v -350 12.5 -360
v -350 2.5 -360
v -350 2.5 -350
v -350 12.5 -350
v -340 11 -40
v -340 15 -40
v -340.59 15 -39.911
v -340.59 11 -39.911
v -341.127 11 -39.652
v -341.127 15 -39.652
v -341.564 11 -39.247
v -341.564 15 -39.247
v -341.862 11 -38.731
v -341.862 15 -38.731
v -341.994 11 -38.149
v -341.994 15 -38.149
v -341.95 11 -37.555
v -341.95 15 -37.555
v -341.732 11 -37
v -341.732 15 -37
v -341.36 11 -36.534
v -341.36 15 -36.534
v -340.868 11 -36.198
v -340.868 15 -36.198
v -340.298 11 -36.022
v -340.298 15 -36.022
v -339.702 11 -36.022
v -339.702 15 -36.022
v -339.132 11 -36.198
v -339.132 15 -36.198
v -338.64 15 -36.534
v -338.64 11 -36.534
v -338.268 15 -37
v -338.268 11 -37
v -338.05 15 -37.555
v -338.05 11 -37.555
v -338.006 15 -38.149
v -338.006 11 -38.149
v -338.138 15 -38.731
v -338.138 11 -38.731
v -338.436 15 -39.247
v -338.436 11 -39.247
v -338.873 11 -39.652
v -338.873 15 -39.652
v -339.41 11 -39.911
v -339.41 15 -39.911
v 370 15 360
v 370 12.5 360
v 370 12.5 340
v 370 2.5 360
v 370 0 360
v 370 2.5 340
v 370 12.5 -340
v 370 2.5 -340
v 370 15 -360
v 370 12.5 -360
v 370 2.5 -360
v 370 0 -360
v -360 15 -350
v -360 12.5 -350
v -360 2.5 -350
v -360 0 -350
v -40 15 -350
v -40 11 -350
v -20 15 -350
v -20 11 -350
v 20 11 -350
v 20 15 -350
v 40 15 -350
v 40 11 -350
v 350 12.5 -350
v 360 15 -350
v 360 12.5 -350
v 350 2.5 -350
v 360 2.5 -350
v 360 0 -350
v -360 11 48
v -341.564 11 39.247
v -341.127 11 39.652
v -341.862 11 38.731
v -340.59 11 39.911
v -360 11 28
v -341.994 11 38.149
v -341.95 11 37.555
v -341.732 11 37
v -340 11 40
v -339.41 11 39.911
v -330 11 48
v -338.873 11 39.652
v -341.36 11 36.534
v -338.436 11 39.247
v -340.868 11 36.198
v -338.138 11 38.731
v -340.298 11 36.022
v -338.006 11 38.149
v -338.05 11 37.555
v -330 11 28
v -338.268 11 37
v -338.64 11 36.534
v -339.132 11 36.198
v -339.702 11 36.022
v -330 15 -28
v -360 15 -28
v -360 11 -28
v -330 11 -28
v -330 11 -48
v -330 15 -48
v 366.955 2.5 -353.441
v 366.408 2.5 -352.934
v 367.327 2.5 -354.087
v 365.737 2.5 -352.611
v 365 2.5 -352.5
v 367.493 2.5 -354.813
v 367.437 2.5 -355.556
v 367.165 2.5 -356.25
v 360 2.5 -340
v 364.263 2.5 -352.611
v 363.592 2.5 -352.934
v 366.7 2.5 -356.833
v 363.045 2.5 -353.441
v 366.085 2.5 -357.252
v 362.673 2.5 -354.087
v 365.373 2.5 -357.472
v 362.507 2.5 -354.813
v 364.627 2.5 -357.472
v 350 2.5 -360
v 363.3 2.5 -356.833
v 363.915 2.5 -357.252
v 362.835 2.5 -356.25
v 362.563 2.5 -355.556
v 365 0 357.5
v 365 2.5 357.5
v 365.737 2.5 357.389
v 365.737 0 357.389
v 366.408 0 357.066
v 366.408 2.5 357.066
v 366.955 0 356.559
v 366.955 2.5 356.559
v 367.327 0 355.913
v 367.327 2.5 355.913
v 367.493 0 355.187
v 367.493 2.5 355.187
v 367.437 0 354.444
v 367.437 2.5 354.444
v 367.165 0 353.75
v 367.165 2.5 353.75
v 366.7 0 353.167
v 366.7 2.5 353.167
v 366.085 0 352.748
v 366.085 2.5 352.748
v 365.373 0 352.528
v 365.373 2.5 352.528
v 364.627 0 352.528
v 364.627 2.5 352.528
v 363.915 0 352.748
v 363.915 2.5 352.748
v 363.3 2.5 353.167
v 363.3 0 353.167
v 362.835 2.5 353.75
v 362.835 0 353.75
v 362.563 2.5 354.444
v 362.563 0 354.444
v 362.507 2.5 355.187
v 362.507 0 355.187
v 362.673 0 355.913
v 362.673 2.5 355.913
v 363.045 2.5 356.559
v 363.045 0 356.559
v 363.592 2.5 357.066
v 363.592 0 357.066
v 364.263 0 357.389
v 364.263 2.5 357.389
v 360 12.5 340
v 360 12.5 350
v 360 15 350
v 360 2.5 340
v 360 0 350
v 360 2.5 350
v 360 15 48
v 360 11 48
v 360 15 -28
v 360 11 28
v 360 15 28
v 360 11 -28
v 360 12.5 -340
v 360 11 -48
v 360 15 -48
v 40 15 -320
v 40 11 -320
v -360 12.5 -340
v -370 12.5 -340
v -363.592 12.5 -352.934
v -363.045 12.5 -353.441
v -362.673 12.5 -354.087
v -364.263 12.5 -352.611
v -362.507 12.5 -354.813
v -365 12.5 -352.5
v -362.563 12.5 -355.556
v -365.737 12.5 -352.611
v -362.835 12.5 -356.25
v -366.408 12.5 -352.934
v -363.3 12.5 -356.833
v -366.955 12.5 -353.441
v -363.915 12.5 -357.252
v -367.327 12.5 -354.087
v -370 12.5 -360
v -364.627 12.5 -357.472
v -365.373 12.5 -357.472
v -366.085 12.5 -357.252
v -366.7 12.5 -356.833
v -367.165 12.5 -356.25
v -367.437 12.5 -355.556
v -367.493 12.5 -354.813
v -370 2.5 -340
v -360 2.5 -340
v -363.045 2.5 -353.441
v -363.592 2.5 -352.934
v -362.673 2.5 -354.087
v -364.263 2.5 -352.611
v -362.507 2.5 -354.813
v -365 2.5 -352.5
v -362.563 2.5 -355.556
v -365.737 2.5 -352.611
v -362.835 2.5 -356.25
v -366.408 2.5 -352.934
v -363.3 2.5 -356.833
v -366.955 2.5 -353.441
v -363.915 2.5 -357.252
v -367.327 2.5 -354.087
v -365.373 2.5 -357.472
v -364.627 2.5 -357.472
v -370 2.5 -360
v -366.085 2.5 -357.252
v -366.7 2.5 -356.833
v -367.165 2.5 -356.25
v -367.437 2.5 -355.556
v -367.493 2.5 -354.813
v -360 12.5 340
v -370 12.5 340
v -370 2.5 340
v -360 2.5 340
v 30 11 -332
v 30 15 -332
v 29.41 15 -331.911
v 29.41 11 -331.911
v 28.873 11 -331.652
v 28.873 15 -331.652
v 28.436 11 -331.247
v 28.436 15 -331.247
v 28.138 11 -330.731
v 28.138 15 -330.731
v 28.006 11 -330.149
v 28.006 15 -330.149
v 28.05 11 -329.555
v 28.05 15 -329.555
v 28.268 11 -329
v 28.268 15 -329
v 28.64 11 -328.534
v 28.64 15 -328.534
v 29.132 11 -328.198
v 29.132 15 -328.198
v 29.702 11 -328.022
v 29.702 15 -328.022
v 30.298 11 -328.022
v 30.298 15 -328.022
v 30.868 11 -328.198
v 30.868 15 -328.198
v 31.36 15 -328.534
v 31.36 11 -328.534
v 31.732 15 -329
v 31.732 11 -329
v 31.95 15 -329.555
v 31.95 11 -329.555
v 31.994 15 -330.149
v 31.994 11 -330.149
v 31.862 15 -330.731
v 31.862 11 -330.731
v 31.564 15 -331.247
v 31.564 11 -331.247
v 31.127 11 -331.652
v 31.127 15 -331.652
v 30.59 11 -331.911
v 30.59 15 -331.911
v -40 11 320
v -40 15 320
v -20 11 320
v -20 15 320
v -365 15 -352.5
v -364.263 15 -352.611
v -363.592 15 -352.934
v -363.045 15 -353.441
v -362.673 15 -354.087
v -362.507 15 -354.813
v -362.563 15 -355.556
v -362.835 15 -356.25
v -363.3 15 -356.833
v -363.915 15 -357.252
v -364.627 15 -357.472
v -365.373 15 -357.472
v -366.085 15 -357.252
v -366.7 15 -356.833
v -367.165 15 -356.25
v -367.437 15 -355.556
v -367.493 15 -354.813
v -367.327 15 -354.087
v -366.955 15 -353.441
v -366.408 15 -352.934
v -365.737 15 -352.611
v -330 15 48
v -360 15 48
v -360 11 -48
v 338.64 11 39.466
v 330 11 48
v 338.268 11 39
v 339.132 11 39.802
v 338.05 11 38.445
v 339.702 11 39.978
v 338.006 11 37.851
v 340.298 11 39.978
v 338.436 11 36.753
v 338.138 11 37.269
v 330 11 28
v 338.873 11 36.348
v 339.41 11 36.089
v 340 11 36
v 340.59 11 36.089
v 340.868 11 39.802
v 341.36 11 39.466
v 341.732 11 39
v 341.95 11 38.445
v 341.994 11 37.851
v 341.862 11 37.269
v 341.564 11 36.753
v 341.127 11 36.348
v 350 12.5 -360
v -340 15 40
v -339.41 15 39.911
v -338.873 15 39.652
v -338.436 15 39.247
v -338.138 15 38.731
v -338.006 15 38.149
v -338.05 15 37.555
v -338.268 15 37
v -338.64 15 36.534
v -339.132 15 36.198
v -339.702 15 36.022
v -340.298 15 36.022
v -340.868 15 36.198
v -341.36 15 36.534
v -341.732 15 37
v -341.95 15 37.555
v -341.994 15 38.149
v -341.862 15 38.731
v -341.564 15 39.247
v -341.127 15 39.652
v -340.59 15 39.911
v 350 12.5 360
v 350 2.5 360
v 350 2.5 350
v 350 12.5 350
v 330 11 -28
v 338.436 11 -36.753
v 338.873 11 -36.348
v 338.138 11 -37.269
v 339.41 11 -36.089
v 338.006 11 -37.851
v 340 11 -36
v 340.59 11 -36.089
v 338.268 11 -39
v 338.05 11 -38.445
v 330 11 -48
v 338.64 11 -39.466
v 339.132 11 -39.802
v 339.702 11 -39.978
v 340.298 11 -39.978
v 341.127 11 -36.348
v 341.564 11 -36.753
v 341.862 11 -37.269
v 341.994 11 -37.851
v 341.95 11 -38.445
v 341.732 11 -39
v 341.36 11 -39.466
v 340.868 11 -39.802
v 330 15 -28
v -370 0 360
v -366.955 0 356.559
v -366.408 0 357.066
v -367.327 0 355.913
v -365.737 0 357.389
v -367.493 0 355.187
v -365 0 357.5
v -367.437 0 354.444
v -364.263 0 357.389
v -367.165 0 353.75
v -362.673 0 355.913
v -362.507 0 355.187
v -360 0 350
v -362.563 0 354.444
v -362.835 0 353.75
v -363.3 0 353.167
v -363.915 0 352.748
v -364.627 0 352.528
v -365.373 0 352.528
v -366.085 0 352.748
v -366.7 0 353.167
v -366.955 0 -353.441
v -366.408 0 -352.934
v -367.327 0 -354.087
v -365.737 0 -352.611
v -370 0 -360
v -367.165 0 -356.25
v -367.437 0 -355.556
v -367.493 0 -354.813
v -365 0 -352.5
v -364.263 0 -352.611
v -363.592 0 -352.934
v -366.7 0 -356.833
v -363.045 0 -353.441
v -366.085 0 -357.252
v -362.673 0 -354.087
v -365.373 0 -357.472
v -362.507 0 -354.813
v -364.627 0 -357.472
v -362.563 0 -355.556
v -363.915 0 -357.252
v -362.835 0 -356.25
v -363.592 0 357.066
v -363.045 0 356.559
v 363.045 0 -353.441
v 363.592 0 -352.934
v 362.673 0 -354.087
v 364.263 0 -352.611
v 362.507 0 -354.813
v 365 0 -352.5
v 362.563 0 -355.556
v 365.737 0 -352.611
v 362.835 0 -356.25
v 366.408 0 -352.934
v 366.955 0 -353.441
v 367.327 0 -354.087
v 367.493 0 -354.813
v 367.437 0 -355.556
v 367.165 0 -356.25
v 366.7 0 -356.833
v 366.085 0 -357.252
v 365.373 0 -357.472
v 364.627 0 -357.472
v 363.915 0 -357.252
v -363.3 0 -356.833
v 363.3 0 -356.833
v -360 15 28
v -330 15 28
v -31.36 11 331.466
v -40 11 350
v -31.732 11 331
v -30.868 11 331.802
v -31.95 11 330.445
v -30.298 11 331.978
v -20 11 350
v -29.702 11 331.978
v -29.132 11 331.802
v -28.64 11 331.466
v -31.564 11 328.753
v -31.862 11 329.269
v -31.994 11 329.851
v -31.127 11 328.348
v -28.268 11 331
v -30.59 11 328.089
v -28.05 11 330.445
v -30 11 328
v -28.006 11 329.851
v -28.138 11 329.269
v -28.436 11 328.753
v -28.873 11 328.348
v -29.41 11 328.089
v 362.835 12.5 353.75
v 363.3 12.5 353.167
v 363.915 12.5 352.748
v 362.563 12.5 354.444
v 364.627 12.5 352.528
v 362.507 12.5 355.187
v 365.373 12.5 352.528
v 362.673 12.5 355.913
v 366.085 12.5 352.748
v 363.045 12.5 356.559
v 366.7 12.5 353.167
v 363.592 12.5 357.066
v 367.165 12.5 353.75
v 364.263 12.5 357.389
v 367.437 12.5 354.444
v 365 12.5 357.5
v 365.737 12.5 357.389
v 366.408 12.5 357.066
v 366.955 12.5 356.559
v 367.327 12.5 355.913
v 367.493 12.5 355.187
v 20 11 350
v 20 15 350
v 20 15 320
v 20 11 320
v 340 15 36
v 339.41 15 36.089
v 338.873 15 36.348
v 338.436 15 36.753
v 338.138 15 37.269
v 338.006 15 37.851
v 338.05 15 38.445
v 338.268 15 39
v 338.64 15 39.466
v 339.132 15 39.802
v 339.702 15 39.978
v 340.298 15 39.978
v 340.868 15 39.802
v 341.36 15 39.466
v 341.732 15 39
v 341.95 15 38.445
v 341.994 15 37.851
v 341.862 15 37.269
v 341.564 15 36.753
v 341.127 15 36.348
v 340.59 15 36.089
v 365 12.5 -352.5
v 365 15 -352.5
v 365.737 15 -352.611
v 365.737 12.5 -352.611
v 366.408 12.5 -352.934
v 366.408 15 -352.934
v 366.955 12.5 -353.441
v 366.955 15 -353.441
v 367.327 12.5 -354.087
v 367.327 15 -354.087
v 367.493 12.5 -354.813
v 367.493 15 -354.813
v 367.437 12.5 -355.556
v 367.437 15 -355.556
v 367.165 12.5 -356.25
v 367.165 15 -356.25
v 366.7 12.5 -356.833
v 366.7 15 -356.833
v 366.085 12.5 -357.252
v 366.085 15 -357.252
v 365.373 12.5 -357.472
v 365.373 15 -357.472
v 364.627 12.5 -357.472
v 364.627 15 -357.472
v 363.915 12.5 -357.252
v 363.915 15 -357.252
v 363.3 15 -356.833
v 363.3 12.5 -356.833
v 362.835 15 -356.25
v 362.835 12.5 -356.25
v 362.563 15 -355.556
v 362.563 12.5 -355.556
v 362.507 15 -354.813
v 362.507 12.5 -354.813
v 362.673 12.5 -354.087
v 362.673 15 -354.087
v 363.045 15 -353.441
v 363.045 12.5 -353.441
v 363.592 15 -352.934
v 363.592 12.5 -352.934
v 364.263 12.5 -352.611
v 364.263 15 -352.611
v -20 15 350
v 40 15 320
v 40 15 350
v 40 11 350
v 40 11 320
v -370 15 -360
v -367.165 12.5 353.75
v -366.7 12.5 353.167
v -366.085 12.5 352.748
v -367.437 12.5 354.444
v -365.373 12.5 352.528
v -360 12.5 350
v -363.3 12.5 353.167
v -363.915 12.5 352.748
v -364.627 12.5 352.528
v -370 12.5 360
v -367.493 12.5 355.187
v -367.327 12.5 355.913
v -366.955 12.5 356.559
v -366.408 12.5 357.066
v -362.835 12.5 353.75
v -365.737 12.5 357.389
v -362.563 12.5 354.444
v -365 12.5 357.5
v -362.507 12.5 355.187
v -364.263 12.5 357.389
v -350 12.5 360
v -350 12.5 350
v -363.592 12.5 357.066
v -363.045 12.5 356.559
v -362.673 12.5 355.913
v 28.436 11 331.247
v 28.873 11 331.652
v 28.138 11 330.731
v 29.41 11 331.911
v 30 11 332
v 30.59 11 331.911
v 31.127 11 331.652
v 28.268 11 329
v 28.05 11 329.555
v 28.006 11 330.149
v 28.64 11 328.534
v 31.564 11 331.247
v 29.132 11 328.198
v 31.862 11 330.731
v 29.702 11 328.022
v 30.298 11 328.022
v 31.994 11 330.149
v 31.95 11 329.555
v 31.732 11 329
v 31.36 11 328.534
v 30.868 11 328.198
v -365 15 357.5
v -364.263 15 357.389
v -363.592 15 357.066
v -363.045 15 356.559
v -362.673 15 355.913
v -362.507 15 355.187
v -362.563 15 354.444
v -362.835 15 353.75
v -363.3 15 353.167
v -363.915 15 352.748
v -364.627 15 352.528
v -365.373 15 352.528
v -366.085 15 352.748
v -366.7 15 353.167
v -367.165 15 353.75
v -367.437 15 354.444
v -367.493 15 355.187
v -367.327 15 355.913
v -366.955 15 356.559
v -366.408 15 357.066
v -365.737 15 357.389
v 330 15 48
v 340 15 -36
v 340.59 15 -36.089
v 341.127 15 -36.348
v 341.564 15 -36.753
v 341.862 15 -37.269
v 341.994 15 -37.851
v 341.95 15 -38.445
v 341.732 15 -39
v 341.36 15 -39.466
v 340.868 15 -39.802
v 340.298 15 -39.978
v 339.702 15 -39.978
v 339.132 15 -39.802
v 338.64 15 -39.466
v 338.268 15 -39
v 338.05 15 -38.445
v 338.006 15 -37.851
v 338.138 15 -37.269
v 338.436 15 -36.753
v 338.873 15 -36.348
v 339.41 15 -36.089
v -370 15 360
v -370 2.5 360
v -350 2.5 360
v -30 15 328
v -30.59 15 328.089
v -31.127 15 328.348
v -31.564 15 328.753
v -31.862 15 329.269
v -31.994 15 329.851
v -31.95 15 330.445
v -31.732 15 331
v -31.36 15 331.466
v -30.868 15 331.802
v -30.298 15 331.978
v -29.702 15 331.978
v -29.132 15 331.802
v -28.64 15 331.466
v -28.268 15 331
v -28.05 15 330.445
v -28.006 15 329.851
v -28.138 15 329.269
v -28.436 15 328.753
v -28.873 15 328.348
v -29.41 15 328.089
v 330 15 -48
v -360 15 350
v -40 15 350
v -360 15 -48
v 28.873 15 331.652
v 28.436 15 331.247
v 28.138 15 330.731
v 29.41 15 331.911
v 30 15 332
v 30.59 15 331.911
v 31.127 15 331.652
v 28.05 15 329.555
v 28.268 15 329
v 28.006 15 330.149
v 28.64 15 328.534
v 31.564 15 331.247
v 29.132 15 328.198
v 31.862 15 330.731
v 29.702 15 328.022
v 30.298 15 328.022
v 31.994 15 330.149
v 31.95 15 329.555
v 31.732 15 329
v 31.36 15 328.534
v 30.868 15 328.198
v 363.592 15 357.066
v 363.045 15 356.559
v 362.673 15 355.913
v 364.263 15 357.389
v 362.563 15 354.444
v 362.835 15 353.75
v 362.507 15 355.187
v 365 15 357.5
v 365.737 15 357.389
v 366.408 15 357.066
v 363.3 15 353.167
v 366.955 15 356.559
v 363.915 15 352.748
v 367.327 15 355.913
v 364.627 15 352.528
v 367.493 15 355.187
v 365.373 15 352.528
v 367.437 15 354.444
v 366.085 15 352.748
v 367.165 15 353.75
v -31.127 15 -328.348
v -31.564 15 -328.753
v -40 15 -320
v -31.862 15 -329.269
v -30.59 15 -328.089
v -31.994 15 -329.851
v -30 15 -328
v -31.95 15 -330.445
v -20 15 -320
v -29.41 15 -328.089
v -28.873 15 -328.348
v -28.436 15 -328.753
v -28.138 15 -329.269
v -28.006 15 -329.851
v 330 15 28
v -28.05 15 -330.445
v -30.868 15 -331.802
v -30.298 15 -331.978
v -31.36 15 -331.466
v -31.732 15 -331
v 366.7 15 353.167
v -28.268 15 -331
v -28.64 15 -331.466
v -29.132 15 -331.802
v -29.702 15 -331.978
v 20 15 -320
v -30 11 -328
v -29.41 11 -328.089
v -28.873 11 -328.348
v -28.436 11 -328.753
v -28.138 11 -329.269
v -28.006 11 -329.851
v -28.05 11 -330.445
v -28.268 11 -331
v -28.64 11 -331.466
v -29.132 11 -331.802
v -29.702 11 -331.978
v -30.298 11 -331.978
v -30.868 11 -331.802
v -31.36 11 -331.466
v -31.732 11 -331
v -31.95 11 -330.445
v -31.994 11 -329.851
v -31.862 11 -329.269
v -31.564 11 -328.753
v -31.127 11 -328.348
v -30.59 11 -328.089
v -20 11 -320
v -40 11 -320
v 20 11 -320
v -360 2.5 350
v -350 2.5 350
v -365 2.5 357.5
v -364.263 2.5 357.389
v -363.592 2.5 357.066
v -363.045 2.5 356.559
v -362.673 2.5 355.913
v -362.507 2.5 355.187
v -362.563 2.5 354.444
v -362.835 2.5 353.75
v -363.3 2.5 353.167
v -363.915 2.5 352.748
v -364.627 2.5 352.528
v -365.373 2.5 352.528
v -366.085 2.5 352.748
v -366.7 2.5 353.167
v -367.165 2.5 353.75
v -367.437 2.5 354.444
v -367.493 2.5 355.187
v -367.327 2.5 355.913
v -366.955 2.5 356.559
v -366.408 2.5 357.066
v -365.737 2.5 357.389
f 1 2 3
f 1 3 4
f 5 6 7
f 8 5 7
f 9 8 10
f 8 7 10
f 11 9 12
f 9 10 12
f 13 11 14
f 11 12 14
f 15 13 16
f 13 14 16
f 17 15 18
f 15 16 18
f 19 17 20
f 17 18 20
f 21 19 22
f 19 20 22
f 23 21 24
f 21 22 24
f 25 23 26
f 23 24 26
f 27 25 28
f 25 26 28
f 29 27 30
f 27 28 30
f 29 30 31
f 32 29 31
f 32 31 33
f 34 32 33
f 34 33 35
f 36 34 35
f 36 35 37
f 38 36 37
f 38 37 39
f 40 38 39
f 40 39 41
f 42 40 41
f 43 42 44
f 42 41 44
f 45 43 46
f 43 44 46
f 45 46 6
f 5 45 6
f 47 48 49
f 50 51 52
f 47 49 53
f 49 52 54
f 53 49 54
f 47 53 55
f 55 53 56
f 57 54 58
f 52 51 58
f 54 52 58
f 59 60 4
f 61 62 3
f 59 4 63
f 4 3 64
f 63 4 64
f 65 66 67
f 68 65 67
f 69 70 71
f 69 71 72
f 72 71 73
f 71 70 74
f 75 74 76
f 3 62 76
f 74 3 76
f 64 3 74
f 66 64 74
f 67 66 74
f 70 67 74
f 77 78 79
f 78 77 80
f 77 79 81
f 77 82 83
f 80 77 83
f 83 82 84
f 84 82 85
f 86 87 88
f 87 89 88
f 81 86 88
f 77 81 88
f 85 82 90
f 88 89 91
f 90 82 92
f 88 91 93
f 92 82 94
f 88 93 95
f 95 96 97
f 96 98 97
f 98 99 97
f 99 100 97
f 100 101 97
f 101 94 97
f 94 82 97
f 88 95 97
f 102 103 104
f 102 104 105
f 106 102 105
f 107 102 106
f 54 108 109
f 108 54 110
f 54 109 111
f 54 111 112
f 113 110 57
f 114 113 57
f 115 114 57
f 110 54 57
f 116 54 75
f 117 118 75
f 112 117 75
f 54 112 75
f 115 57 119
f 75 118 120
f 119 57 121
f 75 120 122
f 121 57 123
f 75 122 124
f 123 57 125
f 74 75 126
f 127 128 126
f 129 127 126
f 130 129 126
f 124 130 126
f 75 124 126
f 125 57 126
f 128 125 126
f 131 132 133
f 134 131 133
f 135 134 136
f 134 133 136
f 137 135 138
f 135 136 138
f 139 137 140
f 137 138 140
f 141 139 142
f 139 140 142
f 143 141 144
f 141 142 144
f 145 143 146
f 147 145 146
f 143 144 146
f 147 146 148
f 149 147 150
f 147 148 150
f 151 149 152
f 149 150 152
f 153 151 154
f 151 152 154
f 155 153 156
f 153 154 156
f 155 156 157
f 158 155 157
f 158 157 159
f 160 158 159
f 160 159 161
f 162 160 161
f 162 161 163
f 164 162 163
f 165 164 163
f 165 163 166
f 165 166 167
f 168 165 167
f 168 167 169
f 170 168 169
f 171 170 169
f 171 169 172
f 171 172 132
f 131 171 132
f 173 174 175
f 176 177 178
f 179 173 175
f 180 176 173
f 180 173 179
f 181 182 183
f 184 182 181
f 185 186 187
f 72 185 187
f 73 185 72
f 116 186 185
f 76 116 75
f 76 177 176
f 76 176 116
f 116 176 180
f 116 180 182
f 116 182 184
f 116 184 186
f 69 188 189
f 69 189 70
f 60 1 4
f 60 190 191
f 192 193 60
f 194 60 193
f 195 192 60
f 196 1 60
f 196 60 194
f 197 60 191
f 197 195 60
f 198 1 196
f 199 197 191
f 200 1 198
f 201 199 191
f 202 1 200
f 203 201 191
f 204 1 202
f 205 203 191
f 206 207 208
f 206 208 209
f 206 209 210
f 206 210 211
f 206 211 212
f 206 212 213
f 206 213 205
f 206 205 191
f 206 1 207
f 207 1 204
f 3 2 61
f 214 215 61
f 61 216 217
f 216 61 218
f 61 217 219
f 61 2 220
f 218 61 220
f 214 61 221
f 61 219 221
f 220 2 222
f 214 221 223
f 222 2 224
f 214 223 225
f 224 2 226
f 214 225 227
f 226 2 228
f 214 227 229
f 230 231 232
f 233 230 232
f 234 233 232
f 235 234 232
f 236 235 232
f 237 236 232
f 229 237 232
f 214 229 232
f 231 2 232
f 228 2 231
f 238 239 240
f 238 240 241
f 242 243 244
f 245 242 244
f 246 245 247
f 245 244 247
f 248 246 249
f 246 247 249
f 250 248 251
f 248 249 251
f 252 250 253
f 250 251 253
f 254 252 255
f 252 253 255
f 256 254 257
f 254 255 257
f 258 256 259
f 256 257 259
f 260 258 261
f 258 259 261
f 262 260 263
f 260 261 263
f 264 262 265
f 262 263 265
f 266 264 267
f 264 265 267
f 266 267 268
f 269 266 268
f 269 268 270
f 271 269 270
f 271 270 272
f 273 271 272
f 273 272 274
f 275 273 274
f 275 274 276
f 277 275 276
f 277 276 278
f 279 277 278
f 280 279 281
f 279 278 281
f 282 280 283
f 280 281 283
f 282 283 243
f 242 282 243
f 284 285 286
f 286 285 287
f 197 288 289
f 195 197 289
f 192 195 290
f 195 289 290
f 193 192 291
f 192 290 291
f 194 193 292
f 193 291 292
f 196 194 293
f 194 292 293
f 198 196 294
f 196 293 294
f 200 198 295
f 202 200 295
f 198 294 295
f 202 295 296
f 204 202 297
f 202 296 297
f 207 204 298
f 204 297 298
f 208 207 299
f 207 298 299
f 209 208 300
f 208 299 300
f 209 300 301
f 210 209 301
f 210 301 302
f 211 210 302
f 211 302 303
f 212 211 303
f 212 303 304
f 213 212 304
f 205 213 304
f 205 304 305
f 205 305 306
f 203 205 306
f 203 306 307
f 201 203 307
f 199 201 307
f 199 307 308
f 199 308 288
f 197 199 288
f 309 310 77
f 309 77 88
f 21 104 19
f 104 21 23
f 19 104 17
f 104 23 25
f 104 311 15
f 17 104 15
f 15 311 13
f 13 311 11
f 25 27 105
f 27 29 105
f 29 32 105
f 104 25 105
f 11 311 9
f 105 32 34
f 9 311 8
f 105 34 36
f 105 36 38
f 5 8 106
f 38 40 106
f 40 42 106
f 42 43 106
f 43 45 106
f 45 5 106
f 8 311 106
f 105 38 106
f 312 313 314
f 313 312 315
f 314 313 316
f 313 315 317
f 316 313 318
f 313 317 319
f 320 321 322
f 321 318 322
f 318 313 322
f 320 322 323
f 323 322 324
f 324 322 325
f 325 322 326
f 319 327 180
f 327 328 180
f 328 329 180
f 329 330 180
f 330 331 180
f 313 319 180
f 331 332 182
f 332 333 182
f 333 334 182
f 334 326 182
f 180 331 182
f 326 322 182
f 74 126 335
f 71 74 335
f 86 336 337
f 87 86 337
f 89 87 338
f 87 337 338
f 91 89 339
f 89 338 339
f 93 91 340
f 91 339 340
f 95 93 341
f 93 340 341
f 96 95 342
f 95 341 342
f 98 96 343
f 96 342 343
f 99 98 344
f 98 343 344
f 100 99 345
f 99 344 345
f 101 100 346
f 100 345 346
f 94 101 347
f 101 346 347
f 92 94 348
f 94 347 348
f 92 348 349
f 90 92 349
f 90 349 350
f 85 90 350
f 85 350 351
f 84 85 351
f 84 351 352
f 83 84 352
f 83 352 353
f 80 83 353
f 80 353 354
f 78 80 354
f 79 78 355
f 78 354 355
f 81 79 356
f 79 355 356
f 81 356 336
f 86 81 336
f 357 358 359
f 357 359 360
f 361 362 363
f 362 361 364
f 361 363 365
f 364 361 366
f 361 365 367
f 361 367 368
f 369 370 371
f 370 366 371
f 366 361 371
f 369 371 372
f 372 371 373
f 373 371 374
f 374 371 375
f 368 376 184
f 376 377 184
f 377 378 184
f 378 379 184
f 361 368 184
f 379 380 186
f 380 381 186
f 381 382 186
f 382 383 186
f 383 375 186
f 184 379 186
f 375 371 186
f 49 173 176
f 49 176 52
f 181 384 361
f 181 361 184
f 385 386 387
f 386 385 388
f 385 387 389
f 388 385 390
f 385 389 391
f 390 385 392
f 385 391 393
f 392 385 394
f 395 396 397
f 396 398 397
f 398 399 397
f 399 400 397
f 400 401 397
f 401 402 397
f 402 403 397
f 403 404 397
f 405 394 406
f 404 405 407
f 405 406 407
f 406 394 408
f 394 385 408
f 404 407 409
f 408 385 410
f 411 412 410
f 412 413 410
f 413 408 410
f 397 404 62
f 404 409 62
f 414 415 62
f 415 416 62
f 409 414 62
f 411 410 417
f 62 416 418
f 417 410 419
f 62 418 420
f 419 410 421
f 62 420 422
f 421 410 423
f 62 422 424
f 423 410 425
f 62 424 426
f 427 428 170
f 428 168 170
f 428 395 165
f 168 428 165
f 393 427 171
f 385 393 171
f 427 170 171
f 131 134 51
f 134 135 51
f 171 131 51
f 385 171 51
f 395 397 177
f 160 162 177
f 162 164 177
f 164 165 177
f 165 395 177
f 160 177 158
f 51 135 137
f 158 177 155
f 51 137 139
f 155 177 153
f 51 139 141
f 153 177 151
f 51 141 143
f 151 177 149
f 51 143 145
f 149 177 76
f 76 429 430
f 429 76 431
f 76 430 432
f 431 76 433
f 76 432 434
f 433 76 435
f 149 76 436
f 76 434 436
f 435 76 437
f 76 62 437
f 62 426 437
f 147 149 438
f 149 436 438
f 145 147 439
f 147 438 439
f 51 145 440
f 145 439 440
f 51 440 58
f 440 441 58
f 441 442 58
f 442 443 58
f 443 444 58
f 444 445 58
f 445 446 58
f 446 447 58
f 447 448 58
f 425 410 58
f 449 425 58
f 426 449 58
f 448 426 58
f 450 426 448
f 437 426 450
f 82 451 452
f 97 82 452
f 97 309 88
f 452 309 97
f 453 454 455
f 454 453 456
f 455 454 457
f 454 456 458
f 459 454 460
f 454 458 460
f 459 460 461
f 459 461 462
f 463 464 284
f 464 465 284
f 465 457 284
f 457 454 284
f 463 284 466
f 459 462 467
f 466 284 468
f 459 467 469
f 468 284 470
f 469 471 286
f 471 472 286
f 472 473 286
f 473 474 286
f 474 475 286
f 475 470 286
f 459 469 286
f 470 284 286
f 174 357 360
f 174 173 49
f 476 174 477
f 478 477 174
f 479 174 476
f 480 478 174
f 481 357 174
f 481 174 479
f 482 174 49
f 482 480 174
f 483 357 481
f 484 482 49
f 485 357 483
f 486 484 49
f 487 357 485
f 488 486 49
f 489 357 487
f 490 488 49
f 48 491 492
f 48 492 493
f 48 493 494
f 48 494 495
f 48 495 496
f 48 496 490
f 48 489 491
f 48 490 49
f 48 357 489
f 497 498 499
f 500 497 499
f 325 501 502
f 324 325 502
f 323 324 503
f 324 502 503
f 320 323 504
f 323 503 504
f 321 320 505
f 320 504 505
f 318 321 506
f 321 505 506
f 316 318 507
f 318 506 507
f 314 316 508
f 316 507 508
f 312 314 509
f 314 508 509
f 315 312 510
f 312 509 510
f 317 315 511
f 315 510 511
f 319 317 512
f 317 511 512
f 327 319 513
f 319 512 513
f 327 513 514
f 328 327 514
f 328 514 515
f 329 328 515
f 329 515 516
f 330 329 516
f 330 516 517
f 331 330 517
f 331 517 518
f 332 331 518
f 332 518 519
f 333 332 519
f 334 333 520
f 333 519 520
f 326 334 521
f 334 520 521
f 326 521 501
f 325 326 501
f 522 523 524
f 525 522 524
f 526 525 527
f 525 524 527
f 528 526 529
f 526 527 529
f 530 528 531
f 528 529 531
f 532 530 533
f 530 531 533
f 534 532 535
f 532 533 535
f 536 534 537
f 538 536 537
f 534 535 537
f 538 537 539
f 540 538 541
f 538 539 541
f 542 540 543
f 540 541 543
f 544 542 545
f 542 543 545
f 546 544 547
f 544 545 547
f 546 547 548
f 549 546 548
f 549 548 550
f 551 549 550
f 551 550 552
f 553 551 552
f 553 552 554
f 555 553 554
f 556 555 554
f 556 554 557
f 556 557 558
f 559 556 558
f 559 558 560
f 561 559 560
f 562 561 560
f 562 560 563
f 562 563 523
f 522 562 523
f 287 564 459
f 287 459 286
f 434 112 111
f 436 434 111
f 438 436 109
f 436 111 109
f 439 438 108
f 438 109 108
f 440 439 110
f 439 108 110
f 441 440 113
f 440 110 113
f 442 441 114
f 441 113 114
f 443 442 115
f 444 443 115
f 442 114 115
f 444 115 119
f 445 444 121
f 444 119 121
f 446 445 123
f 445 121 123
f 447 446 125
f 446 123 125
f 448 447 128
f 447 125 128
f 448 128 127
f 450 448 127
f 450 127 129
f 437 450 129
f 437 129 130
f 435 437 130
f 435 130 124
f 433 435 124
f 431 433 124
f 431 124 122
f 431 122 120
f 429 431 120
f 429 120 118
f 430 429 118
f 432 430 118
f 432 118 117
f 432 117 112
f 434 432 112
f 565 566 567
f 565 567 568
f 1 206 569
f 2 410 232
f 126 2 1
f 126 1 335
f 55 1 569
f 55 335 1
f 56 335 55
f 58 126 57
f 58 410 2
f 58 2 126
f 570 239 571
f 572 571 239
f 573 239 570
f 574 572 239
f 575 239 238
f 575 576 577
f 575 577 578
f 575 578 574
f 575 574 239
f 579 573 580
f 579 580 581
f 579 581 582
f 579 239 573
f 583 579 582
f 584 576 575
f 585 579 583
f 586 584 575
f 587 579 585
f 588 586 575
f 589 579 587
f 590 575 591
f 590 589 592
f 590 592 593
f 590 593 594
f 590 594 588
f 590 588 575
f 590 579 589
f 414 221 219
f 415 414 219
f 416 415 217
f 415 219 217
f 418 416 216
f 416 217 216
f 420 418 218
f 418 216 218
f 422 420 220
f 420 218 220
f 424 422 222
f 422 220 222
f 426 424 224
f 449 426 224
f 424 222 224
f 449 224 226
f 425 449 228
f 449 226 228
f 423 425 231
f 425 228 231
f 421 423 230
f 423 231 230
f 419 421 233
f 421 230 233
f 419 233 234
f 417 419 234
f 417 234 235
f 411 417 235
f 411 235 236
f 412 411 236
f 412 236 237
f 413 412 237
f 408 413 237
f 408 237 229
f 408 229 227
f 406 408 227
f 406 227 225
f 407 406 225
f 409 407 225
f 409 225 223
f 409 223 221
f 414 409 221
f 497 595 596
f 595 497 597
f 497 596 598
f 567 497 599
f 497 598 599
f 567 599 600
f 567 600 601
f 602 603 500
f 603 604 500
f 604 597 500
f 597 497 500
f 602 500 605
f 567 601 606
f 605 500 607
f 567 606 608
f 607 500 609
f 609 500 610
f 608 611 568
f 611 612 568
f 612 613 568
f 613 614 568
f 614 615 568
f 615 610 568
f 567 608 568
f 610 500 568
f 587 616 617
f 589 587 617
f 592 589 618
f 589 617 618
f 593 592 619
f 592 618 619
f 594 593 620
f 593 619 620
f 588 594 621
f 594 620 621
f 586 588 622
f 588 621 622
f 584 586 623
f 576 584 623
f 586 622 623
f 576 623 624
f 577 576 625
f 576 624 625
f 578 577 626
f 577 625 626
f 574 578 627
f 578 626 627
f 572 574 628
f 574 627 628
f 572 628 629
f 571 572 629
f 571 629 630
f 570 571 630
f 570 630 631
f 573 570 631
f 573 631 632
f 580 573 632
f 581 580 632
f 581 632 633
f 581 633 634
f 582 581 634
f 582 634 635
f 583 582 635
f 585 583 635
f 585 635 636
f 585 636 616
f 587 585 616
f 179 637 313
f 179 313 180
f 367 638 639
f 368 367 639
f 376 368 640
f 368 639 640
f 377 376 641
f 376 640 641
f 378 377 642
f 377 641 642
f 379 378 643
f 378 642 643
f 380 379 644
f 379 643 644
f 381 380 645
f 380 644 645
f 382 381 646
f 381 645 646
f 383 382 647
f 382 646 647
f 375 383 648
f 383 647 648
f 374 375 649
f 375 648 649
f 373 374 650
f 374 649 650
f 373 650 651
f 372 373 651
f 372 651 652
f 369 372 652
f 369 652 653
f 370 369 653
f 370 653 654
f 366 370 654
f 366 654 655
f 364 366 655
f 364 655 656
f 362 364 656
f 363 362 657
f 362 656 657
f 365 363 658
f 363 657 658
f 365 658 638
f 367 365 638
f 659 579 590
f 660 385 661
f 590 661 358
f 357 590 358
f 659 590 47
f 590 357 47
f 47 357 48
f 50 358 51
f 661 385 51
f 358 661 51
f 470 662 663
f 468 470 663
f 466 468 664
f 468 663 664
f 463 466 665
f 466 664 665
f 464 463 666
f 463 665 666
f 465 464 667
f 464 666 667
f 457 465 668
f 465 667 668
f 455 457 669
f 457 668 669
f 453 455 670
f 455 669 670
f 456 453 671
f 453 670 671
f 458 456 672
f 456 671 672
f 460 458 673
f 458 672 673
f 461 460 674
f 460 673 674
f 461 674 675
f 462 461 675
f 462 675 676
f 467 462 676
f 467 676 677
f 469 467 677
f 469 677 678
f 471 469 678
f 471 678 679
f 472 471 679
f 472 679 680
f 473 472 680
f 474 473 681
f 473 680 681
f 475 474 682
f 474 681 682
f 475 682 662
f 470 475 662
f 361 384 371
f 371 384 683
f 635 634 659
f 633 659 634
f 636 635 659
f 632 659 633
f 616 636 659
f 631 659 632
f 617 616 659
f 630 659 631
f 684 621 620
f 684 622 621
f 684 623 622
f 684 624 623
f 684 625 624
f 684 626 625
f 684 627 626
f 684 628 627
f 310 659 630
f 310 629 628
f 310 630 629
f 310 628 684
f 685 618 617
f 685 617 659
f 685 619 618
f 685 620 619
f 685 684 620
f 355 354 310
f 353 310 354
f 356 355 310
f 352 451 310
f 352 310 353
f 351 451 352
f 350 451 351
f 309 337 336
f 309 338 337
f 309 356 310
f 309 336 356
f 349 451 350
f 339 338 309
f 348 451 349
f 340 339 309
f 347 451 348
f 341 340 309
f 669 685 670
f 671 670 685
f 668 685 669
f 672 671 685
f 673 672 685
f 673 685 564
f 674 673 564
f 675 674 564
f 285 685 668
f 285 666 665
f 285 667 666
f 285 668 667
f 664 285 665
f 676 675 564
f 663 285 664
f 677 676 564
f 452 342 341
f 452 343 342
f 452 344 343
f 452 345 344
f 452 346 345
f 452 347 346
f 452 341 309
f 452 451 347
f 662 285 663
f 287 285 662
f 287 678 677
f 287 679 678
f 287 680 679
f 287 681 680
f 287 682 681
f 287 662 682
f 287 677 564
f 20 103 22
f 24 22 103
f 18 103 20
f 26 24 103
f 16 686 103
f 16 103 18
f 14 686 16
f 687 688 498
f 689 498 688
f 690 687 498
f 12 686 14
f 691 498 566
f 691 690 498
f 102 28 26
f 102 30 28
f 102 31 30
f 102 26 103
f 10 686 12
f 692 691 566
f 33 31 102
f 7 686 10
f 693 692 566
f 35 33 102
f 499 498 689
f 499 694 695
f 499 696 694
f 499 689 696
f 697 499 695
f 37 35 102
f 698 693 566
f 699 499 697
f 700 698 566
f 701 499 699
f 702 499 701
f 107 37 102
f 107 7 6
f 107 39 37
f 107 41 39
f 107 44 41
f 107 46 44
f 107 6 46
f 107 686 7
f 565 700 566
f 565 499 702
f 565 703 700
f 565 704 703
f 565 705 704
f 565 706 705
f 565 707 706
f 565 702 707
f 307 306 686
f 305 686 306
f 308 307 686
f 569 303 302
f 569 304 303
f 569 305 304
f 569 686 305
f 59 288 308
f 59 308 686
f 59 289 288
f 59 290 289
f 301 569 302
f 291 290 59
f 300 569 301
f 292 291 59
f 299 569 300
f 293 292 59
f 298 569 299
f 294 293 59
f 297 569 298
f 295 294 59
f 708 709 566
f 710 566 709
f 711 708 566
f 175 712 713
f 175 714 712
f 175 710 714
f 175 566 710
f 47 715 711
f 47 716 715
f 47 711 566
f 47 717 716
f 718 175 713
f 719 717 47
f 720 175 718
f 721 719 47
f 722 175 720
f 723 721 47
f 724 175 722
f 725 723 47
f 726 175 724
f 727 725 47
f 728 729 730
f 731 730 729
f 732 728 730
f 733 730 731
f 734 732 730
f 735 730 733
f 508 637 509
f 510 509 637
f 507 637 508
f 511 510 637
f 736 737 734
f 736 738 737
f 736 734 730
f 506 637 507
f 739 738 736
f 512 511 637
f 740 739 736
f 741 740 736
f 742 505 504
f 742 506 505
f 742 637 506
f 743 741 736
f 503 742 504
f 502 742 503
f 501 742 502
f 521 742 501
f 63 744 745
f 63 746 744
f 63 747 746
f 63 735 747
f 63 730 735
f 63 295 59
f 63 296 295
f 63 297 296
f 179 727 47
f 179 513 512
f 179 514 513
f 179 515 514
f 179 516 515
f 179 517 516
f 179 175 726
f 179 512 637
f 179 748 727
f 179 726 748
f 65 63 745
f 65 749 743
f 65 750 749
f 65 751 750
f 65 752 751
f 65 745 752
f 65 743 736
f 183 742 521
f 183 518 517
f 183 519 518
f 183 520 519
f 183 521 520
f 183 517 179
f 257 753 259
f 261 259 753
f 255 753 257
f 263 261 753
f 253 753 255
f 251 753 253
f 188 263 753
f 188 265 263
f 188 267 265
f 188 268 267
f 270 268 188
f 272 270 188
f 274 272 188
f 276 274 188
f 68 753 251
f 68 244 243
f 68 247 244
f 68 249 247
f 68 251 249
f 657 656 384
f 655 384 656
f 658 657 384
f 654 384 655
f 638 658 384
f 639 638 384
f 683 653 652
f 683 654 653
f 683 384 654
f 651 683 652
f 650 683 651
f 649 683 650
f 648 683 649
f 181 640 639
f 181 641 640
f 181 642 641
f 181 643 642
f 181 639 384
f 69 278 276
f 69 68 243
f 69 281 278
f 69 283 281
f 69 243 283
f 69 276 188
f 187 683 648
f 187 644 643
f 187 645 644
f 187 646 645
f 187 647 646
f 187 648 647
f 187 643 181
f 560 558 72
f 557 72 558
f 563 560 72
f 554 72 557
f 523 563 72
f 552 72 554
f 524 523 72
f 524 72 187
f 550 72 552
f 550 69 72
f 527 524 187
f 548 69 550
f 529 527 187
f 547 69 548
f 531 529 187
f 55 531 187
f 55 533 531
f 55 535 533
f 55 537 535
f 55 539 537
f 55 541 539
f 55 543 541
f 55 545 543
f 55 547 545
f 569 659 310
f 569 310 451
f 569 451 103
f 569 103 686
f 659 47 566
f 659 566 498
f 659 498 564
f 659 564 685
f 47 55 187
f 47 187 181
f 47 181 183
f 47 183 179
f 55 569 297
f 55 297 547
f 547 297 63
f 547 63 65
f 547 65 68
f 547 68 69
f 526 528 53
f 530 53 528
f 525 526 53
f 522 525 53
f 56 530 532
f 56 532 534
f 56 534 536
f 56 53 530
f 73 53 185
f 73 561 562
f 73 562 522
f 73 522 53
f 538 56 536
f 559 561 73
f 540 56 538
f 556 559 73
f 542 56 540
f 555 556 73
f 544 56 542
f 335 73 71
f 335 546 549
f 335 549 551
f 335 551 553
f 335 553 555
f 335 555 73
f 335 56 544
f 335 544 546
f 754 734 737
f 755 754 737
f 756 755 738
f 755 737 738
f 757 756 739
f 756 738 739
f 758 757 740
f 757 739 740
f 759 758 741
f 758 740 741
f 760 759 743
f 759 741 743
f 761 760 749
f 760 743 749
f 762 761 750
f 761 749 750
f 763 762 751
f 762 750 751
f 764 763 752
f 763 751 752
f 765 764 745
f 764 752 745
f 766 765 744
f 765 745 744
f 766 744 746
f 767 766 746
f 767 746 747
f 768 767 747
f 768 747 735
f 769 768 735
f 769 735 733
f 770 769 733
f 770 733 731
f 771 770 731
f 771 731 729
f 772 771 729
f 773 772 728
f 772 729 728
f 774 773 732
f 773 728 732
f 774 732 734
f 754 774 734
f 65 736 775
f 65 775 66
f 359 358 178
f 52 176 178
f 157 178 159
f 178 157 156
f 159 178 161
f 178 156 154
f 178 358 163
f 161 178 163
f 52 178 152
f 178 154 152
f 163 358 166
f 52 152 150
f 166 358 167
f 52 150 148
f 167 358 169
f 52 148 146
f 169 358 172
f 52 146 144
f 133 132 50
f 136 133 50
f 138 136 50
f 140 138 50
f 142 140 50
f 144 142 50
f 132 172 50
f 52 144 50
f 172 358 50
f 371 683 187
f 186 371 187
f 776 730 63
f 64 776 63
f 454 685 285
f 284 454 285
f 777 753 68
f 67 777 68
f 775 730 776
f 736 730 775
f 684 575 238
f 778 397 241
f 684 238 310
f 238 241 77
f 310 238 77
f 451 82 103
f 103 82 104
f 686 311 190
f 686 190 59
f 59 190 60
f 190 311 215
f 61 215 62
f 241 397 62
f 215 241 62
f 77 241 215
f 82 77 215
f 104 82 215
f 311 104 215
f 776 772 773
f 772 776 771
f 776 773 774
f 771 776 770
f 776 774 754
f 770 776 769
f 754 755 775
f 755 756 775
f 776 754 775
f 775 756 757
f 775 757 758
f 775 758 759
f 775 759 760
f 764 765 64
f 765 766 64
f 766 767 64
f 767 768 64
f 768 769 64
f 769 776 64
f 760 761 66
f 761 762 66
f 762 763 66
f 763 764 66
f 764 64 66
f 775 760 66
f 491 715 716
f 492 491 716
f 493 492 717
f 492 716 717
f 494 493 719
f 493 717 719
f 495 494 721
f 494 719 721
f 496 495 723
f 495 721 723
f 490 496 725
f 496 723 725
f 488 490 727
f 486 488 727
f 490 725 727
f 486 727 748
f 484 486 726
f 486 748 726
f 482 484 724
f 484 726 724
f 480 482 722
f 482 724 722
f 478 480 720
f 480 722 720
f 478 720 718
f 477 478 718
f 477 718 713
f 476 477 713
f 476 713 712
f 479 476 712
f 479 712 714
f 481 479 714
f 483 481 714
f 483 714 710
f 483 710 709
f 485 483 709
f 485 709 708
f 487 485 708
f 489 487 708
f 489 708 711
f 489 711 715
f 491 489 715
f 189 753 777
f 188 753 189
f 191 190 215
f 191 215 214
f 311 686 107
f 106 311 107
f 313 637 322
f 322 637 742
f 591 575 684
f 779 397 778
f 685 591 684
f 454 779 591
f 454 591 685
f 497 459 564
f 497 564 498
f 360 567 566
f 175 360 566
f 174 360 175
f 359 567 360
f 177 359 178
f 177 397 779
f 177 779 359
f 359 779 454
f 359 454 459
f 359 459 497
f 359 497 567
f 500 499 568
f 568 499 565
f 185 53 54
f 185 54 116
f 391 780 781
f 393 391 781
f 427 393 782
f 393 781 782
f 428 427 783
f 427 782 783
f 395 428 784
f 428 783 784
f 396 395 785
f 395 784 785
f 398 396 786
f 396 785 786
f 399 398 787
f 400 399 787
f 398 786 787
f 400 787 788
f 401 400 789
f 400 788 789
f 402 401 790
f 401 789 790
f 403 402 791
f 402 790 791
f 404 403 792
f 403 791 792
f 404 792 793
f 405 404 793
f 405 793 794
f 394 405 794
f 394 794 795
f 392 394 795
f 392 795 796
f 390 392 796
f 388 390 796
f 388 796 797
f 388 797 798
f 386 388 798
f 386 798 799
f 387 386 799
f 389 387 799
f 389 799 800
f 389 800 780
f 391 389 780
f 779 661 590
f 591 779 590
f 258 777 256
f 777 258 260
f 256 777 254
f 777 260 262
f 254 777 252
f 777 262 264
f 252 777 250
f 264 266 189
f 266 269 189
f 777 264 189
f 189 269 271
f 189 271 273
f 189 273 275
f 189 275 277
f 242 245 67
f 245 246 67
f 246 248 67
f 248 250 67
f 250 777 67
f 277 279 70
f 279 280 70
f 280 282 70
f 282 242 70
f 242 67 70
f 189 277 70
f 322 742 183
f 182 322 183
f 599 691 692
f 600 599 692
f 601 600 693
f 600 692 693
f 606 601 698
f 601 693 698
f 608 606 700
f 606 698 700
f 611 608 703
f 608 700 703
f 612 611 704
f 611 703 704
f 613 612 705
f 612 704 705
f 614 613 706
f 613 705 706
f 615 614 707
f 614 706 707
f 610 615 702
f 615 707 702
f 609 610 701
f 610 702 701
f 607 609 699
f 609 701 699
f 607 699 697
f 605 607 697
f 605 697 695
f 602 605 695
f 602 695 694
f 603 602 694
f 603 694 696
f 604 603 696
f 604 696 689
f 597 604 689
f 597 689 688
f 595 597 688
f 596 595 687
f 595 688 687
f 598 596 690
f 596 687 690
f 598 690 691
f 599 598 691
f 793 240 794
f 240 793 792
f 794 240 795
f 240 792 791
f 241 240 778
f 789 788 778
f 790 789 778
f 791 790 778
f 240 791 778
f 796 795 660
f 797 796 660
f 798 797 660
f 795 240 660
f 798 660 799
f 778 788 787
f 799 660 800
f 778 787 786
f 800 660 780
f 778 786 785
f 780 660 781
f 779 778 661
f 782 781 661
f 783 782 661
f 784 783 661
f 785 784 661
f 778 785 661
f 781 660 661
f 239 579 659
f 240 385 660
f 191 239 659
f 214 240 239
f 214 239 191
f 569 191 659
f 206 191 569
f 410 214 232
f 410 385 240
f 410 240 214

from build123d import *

# Parameters (mm, degrees)
SKETCH1_W           = 740
SKETCH1_H           = 720
SKETCH1_W_2         = 720
SKETCH1_H_2         = 700
BOSS_EXTRUDE1_DEPTH = 15
SKETCH2_R           = 2.5
CUT_EXTRUDE1_DEPTH  = 517.454257413
SKETCH3_W           = 20
SKETCH3_H           = 10
CUT_EXTRUDE2_DEPTH  = 20
SKETCH5_W           = 20
SKETCH5_H           = 10
CUT_EXTRUDE3_DEPTH  = 20
SKETCH6_W           = 20
SKETCH6_H           = 30
SKETCH6_W_2         = 30
SKETCH6_H_2         = 20
BOSS_EXTRUDE2_DEPTH = 4
SKETCH7_R           = 2
CUT_EXTRUDE4_DEPTH  = 4


with BuildPart() as part:
    # Sketch1 → Boss-Extrude1 (new body)
    with BuildSketch(Plane(origin=(0, 0, 0), x_dir=(1, 0, 0), z_dir=(0, 1, 0))):
        Rectangle(SKETCH1_W, SKETCH1_H)
        Rectangle(SKETCH1_W_2, SKETCH1_H_2, mode=Mode.SUBTRACT)
    extrude(amount=BOSS_EXTRUDE1_DEPTH)

    # Sketch2 → Cut-Extrude1 (cut, through all)
    with BuildSketch(Plane(origin=(0, 15, 0), x_dir=(1, 0, 0), z_dir=(0, 1, 0))):
        with Locations(Location((-365, 355, 0), (0, 0, 270))):
            Circle(SKETCH2_R)
        with Locations(Location((365, 355, 0), (0, 0, 270))):
            Circle(SKETCH2_R)
        with Locations(Location((365, -355, 0), (0, 0, 270))):
            Circle(SKETCH2_R)
        with Locations(Location((-365, -355, 0), (0, 0, 270))):
            Circle(SKETCH2_R)
    extrude(amount=-CUT_EXTRUDE1_DEPTH, mode=Mode.SUBTRACT)

    # Sketch3 → Cut-Extrude2 (cut)
    with BuildSketch(Plane.XY.offset(360)):
        with Locations((-360, 7.5)):
            Rectangle(SKETCH3_W, SKETCH3_H)
        with Locations((360, 7.5)):
            Rectangle(SKETCH3_W, SKETCH3_H)
    extrude(amount=-CUT_EXTRUDE2_DEPTH, mode=Mode.SUBTRACT)

    # Sketch5 → Cut-Extrude3 (cut)
    with BuildSketch(Plane(origin=(0, 0, -360), x_dir=(-1, 0, 0), z_dir=(0, 0, -1))):
        with Locations((-360, 7.5)):
            Rectangle(SKETCH5_W, SKETCH5_H)
        with Locations((360, 7.5)):
            Rectangle(SKETCH5_W, SKETCH5_H)
    extrude(amount=-CUT_EXTRUDE3_DEPTH, mode=Mode.SUBTRACT)

    # Sketch6 → Boss-Extrude2 (add)
    with BuildSketch(Plane(origin=(0, 15, 0), x_dir=(1, 0, 0), z_dir=(0, 1, 0))):
        with Locations((-30, 335)):
            Rectangle(SKETCH6_W, SKETCH6_H)
        with Locations((30, 335)):
            Rectangle(SKETCH6_W, SKETCH6_H)
        with Locations((30, -335)):
            Rectangle(SKETCH6_W, SKETCH6_H)
        with Locations((-30, -335)):
            Rectangle(SKETCH6_W, SKETCH6_H)
        with Locations((-345, -38)):
            Rectangle(SKETCH6_W_2, SKETCH6_H_2)
        with Locations((-345, 38)):
            Rectangle(SKETCH6_W_2, SKETCH6_H_2)
        with Locations((345, -38)):
            Rectangle(SKETCH6_W_2, SKETCH6_H_2)
        with Locations((345, 38)):
            Rectangle(SKETCH6_W_2, SKETCH6_H_2)
    extrude(amount=-BOSS_EXTRUDE2_DEPTH)

    # Sketch7 → Cut-Extrude4 (cut)
    with BuildSketch(Plane(origin=(0, 15, 0), x_dir=(1, 0, 0), z_dir=(0, 1, 0))):
        with Locations(Location((-30, 330, 0), (0, 0, 270))):
            Circle(SKETCH7_R)
        with Locations(Location((30, 330, 0), (0, 0, 90))):
            Circle(SKETCH7_R)
        with Locations(Location((30, -330, 0), (0, 0, 270))):
            Circle(SKETCH7_R)
        with Locations(Location((-30, -330, 0), (0, 0, 90))):
            Circle(SKETCH7_R)
        with Locations(Location((340, 38, 0), (0, 0, 270))):
            Circle(SKETCH7_R)
        with Locations(Location((340, -38, 0), (0, 0, 90))):
            Circle(SKETCH7_R)
        with Locations(Location((-340, -38, 0), (0, 0, 270))):
            Circle(SKETCH7_R)
        with Locations(Location((-340, 38, 0), (0, 0, 90))):
            Circle(SKETCH7_R)
    extrude(amount=-CUT_EXTRUDE4_DEPTH, mode=Mode.SUBTRACT)


solid = part.part
